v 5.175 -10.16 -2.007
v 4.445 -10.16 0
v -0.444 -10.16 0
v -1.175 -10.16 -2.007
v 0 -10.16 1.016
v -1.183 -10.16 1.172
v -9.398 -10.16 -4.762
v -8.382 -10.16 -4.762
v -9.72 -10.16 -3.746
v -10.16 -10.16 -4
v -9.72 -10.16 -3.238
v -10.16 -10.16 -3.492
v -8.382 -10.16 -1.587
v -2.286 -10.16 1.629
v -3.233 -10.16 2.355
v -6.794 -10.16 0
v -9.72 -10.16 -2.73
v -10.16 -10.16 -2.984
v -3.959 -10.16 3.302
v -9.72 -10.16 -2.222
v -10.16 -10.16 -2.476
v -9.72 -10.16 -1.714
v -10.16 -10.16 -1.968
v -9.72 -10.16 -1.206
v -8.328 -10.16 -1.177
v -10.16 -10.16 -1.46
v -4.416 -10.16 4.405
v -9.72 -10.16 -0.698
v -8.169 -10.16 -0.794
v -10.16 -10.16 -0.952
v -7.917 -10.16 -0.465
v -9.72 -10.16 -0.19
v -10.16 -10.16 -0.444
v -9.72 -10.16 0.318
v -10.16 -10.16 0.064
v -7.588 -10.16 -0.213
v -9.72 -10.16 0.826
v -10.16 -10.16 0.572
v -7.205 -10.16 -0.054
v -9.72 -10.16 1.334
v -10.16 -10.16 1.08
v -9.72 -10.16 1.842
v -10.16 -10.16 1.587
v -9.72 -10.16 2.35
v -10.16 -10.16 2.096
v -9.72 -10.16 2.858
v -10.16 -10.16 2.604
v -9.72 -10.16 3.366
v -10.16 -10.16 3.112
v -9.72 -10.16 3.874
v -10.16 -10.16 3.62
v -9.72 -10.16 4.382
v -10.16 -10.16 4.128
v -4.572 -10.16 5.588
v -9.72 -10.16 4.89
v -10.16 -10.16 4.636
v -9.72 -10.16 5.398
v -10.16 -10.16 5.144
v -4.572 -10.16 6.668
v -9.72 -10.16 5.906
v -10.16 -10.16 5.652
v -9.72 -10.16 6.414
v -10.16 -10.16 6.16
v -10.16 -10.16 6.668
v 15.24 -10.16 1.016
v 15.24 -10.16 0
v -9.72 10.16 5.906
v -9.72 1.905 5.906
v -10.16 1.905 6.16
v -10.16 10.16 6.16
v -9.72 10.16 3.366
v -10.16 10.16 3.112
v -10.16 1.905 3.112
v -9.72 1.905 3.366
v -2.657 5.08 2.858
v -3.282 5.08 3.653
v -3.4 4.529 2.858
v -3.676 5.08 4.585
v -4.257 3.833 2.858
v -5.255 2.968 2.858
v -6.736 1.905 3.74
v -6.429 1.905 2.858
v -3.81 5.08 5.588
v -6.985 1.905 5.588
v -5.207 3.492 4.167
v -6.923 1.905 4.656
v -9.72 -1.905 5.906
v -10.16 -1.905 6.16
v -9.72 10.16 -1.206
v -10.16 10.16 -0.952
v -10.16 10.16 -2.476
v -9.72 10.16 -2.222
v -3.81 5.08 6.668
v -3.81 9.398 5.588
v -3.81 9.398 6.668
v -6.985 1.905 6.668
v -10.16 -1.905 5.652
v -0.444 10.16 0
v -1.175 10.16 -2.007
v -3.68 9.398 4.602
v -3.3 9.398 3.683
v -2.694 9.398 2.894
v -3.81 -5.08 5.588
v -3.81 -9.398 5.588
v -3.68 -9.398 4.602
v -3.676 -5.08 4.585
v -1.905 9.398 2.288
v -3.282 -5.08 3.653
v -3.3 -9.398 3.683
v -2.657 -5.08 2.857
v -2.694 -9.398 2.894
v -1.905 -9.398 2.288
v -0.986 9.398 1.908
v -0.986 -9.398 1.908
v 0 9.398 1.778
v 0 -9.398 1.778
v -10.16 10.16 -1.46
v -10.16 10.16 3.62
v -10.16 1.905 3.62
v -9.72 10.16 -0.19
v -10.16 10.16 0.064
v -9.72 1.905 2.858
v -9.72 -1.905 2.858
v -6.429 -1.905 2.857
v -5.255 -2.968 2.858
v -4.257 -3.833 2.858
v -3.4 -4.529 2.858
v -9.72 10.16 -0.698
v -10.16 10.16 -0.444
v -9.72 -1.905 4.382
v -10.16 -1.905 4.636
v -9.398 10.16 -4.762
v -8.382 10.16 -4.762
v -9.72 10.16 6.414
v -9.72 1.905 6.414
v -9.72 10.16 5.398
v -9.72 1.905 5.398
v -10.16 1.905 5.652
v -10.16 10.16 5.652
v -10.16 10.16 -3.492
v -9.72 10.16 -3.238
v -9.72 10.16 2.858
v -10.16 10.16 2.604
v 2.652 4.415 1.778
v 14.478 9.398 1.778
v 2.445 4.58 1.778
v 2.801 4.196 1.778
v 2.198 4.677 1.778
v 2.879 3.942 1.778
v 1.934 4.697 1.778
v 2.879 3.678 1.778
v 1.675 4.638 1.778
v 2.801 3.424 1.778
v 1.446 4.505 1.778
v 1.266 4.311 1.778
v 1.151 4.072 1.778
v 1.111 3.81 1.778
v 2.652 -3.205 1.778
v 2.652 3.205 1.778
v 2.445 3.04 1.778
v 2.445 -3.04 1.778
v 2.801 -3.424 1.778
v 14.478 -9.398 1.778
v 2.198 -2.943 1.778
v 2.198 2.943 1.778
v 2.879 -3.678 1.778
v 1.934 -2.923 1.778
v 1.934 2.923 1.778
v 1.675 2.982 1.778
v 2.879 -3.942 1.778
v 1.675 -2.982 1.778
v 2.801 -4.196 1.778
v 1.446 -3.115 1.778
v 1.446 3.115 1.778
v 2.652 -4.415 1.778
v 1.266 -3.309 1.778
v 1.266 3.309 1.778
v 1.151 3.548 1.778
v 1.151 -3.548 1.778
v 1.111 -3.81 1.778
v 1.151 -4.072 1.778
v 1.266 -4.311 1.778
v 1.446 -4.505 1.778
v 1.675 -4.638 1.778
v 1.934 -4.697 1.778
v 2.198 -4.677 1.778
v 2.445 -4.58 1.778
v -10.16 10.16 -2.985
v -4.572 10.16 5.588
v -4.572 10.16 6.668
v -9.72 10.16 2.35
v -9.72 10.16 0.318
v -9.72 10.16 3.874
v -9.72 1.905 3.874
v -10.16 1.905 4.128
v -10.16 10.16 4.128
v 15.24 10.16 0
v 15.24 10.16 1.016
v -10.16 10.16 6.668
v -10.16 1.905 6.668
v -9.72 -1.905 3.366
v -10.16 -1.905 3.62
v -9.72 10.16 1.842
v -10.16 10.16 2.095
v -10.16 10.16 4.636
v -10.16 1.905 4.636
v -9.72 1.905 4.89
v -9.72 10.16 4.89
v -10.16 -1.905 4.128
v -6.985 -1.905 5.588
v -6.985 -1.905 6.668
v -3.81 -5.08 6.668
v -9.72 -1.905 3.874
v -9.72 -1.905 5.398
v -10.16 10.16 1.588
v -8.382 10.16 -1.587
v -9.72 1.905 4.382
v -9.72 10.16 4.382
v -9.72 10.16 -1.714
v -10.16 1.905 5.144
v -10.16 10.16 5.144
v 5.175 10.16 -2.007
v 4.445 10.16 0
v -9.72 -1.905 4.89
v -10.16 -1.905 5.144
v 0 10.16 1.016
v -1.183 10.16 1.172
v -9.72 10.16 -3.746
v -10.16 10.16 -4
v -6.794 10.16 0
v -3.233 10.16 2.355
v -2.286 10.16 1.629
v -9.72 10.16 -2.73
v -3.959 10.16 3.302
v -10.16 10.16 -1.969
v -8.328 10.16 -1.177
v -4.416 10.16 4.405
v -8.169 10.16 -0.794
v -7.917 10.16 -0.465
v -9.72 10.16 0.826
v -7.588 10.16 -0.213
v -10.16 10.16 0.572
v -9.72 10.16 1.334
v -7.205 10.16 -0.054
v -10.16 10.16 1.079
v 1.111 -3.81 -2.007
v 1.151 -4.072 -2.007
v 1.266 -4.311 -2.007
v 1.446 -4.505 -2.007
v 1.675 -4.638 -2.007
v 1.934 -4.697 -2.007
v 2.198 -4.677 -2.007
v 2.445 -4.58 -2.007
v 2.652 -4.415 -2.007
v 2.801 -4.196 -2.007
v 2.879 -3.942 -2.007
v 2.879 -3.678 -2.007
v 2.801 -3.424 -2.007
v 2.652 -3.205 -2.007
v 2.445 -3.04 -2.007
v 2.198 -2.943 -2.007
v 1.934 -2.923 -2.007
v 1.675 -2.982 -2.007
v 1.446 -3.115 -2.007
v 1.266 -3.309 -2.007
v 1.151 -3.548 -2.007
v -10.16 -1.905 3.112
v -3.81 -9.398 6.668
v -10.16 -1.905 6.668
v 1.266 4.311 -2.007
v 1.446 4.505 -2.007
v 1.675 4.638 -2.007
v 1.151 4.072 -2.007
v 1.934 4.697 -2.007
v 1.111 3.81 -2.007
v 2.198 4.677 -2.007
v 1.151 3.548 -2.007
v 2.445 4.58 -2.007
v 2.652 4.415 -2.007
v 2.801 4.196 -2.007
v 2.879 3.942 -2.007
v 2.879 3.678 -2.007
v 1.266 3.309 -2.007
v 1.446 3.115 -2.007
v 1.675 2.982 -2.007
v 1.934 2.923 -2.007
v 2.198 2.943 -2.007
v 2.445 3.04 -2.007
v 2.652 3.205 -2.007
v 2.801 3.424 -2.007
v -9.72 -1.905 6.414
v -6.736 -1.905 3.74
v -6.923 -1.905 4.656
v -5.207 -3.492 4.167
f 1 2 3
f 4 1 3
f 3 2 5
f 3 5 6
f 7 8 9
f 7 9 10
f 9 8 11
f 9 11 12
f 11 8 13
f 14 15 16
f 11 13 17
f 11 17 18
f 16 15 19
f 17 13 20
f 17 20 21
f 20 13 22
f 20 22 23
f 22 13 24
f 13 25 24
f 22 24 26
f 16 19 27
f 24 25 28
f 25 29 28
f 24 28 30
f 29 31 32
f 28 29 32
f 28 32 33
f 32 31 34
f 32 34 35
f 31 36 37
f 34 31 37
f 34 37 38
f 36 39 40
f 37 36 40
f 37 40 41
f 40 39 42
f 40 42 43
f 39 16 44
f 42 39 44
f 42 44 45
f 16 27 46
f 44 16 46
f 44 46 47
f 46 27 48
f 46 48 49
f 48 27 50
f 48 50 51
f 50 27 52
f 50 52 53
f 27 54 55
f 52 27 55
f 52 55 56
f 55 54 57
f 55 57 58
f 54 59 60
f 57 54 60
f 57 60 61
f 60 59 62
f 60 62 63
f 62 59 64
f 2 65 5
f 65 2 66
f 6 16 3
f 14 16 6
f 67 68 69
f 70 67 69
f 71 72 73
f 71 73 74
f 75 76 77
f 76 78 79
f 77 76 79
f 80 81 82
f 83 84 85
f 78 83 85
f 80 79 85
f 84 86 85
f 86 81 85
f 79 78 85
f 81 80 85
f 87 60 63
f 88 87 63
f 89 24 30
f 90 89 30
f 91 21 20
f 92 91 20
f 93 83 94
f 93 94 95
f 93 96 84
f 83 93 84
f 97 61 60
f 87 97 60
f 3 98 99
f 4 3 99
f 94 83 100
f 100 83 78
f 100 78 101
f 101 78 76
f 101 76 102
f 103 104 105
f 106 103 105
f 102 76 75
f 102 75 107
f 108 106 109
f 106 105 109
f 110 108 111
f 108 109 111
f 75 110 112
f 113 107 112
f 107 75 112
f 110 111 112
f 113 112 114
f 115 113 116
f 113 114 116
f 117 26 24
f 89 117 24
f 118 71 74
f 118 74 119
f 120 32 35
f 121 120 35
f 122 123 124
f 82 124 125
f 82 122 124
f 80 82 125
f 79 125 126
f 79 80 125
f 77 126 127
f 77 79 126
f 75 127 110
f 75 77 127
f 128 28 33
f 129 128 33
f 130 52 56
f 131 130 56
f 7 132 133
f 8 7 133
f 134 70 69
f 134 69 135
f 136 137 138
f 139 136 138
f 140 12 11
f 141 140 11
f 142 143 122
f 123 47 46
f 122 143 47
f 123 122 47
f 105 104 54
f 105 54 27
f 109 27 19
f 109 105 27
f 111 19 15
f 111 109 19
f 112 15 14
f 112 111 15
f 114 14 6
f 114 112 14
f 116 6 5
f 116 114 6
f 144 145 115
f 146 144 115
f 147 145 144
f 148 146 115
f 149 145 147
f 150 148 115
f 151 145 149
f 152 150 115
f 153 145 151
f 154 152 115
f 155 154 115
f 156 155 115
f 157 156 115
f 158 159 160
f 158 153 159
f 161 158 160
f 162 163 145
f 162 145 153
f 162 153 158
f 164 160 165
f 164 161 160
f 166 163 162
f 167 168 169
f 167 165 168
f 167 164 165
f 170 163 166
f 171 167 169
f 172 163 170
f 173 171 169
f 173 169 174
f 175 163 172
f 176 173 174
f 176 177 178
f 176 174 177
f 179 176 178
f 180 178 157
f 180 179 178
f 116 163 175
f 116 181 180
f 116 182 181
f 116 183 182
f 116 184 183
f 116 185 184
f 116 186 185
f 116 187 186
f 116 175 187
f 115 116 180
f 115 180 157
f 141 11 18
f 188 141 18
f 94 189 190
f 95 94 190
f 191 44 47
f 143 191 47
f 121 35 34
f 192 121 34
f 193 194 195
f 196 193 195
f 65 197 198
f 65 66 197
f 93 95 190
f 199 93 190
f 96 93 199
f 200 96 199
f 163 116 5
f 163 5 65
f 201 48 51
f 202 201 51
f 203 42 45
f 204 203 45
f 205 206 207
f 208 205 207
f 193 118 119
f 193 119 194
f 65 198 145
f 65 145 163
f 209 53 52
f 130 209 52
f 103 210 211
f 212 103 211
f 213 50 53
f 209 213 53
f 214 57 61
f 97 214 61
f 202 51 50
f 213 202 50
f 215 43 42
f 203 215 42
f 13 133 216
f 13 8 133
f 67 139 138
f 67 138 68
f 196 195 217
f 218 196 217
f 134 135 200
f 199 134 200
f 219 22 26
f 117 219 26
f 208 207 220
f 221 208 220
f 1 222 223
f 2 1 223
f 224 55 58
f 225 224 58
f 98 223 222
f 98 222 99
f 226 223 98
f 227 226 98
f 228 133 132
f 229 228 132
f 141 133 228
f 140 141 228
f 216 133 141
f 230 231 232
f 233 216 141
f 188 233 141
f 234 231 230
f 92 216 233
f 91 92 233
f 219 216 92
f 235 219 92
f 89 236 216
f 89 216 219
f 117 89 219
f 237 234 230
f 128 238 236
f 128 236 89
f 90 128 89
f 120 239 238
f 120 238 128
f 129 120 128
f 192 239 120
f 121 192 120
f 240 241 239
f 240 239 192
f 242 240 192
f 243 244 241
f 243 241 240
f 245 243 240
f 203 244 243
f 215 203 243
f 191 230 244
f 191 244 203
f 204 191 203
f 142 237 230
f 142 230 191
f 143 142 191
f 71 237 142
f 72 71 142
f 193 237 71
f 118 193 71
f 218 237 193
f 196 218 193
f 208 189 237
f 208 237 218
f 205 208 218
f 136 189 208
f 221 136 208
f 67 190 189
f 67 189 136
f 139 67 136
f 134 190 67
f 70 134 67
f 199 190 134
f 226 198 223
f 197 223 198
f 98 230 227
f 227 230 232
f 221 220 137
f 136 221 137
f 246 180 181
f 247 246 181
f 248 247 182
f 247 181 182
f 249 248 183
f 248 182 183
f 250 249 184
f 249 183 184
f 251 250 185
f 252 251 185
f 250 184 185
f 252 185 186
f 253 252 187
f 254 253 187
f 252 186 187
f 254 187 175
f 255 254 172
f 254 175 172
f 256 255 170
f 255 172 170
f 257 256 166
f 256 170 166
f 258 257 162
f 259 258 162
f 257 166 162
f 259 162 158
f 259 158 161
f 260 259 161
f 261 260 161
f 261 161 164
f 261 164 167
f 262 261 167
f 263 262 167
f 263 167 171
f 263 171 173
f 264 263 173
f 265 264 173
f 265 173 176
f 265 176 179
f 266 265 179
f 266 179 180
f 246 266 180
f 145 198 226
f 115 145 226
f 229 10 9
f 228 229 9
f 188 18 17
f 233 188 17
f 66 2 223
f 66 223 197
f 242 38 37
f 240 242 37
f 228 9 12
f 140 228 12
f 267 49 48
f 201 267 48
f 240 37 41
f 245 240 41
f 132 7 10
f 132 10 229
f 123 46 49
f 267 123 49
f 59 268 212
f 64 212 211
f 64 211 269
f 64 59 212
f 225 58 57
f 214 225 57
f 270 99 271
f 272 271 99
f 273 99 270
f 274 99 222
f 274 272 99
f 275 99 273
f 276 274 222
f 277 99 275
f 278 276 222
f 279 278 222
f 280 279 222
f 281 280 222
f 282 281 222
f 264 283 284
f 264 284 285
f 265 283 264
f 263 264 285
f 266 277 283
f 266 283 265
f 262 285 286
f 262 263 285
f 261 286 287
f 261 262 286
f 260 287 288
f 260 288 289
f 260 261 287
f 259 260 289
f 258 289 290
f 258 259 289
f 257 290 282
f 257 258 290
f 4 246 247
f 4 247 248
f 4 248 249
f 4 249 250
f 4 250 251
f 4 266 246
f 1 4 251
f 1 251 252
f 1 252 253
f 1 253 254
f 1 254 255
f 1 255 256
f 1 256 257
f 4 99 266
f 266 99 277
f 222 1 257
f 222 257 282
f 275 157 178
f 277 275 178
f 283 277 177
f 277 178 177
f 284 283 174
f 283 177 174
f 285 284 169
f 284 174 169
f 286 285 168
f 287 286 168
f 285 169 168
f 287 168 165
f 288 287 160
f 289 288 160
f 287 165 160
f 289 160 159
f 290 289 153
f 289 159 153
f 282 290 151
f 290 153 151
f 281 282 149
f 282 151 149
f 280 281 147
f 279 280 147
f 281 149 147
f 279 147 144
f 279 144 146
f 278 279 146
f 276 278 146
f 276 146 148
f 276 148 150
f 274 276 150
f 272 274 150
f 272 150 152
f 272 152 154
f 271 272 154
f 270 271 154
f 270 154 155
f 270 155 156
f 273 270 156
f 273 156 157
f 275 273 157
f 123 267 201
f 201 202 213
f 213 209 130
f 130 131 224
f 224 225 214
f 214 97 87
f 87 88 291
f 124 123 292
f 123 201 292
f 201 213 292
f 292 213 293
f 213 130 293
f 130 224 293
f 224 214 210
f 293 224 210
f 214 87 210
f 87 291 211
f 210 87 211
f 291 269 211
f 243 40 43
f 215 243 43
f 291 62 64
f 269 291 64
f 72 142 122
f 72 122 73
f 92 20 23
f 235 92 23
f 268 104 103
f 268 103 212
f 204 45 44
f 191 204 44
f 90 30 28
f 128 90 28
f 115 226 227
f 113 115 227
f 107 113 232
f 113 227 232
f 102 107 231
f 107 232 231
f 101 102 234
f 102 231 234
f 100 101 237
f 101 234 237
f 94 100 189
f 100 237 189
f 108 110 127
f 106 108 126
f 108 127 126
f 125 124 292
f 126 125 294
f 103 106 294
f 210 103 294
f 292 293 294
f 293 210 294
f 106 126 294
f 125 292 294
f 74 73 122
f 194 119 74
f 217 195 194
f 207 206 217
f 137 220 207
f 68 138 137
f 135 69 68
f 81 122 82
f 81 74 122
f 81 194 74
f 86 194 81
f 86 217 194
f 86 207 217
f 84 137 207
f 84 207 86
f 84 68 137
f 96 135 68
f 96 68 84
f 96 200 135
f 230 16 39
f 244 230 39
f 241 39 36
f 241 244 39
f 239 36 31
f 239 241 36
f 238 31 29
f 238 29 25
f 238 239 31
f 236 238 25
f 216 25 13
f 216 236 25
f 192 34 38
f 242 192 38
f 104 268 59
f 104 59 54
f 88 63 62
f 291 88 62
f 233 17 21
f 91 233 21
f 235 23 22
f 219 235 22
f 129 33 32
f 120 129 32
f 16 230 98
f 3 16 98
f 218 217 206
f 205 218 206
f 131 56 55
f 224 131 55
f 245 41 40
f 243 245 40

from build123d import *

# Parameters (mm, degrees)
F1_DEPTH     = 10.16
F2_W         = 3.81
F2_H         = 3.81
F3_DEPTH     = 25.4
F4_R         = 1.5875
F5_T4_DEPTH  = 20.32
F5_T10_DEPTH = 20.32
F5_T16_DEPTH = 20.32
F5_T23_DEPTH = 20.32
F5_T29_DEPTH = 20.32
F6_SIZE      = 3.175
F7_SIZE      = 0.762
F8_SIZE      = 0.762
F10_D        = 1.778
F12_DEPTH    = 25.4


# Not quite as in the source:
# - a fillet or chamfer that OpenCascade refuses, or shapes differently, is made with other operations: its cross-section is extruded or revolved along the edge and cut away or added


with BuildPart() as f1:
    # F0 (on Front) → F1 (new body, symmetric)
    with BuildSketch(Plane.XZ):
        Polygon((-8.382, 0), (-0.4445, 0), (-1.1748426721, -2.0066), (5.1751573279, -2.0066), (4.4448146558, 0), (15.24, 0), (15.24, 1.778), (-3.81, 1.778), (-3.81, 6.6675), (-10.16, 6.6675), (-10.16, -4.7625), (-8.382, -4.7625), align=None)
    extrude(amount=F1_DEPTH, both=True)

    # F2 (on face) → F3 (cut)
    with BuildSketch(Plane(origin=(-10.16, 0, 0), x_dir=(0, -1, 0), z_dir=(-1, 0, 0))):
        with Locations((0, 4.7625)):
            Rectangle(F2_W, F2_H)
    extrude(amount=-F3_DEPTH, mode=Mode.SUBTRACT)

    # F4
    f4_edges = [f1.edges().sort_by_distance(p)[0] for p in [
        (-8.382, 0, 0),
    ]]
    fillet(f4_edges, radius=F4_R)

    # F5: fillet of radius 3.81 on 1 edges, made by hand


with BuildPart() as f5_tool2:
    # F5_s3 → F5_t4 (new body)
    with BuildSketch(Plane.XZ.offset(10.16)):
        with BuildLine():
            ThreePointArc((-3.81, 5.588), (-2.6940768363, 2.8939231637), (0, 1.778))
            Line((0, 1.778), (-3.81, 1.778))
            Line((-3.81, 1.778), (-3.81, 5.588))
        make_face()
    extrude(amount=-F5_T4_DEPTH)

    split(bisect_by=Plane.XZ.offset(1.905), keep=Keep.TOP)

    split(bisect_by=Plane.XY.offset(2.8575), keep=Keep.TOP)


with BuildPart() as f1_1:
    add(f1.part)

    # F5_t1: union F5_tool2
    add(f5_tool2.part)


with BuildPart() as f5_tool8:
    # F5_s9 → F5_t10 (new body)
    with BuildSketch(Plane.XZ.offset(10.16)):
        with BuildLine():
            ThreePointArc((-3.81, 5.588), (-2.6940768363, 2.8939231637), (0, 1.778))
            Line((0, 1.778), (-3.81, 1.778))
            Line((-3.81, 1.778), (-3.81, 5.588))
        make_face()
    extrude(amount=-F5_T10_DEPTH)

    split(bisect_by=Plane.XZ.offset(1.905), keep=Keep.TOP)

    split(bisect_by=Plane.XY.offset(2.8575), keep=Keep.BOTTOM)


with BuildPart() as f1_2:
    add(f1_1.part)

    # F5_t7: union F5_tool8
    add(f5_tool8.part)


with BuildPart() as f5_tool14:
    # F5_s15 → F5_t16 (new body)
    with BuildSketch(Plane.XZ.offset(10.16)):
        with BuildLine():
            ThreePointArc((-3.81, 5.588), (-2.6940768363, 2.8939231637), (0, 1.778))
            Line((0, 1.778), (-3.81, 1.778))
            Line((-3.81, 1.778), (-3.81, 5.588))
        make_face()
    extrude(amount=-F5_T16_DEPTH)

    split(bisect_by=Plane.XZ.offset(1.905), keep=Keep.BOTTOM)

    split(bisect_by=Plane.XY.offset(2.8575), keep=Keep.BOTTOM)

    split(bisect_by=Plane.XZ.offset(-1.905), keep=Keep.TOP)


with BuildPart() as f1_3:
    add(f1_2.part)

    # F5_t13: union F5_tool14
    add(f5_tool14.part)


with BuildPart() as f5_tool21:
    # F5_s22 → F5_t23 (new body)
    with BuildSketch(Plane.XZ.offset(10.16)):
        with BuildLine():
            ThreePointArc((-3.81, 5.588), (-2.6940768363, 2.8939231637), (0, 1.778))
            Line((0, 1.778), (-3.81, 1.778))
            Line((-3.81, 1.778), (-3.81, 5.588))
        make_face()
    extrude(amount=-F5_T23_DEPTH)

    split(bisect_by=Plane.XY.offset(2.8575), keep=Keep.TOP)

    split(bisect_by=Plane.XZ.offset(-1.905), keep=Keep.BOTTOM)


with BuildPart() as f1_4:
    add(f1_3.part)

    # F5_t20: union F5_tool21
    add(f5_tool21.part)


with BuildPart() as f5_tool27:
    # F5_s28 → F5_t29 (new body)
    with BuildSketch(Plane.XZ.offset(10.16)):
        with BuildLine():
            ThreePointArc((-3.81, 5.588), (-2.6940768363, 2.8939231637), (0, 1.778))
            Line((0, 1.778), (-3.81, 1.778))
            Line((-3.81, 1.778), (-3.81, 5.588))
        make_face()
    extrude(amount=-F5_T29_DEPTH)

    split(bisect_by=Plane.XY.offset(2.8575), keep=Keep.BOTTOM)

    split(bisect_by=Plane.XZ.offset(-1.905), keep=Keep.BOTTOM)


with BuildPart() as f1_5:
    add(f1_4.part)

    # F5_t26: union F5_tool27
    add(f5_tool27.part)

    # F6
    f6_edges = [f1_5.edges().sort_by_distance(p)[0] for p in [
        (-3.509976, -1.905, 4.106052),
        (-3.509976, 1.905, 4.106052),
    ]]
    chamfer(f6_edges, length=F6_SIZE)

    # F7
    f7_edges = [f1_5.edges().sort_by_distance(p)[0] for p in [
        (-10.16, 0, -4.7625),
    ]]
    chamfer(f7_edges, length=F7_SIZE)

    # F8
    f8_edges = [f1_5.edges().sort_by_distance(p)[0] for p in [
        (-2.694077, -10.16, 2.893923),
        (7.62, -10.16, 1.778),
        (7.62, 10.16, 1.778),
        (15.24, 0, 1.778),
    ]]
    chamfer(f8_edges, length=F8_SIZE)

    # F10 (through all)
    with Locations(Plane(origin=(0, 0, -2.0066), x_dir=(1, 0, 0), z_dir=(0, 0, -1))):
        with Locations((2.0001573279, 3.81), (2.0001573279, -3.81)):
            Hole(F10_D / 2)

    # F11 (on face) → F12 (cut)
    with BuildSketch(Plane.XZ.offset(10.16)):
        Polygon((-10.16, -3.4925), (-10.16, -4.0005), (-9.7200590949, -3.7465), align=None)
        Polygon((-10.16, -2.9845), (-10.16, -3.4925), (-9.7200590949, -3.2385), align=None)
        Polygon((-10.16, -2.4765), (-10.16, -2.9845), (-9.7200590949, -2.7305), align=None)
        Polygon((-9.7200590949, -2.2225), (-10.16, -1.9685), (-10.16, -2.4765), align=None)
        Polygon((-9.7200590949, -1.7145), (-10.16, -1.4605), (-10.16, -1.9685), align=None)
        Polygon((-9.7200590949, -1.2065), (-10.16, -0.9525), (-10.16, -1.4605), align=None)
        Polygon((-9.7200590949, -0.6985), (-10.16, -0.4445), (-10.16, -0.9525), align=None)
        Polygon((-9.7200590949, -0.1905), (-10.16, 0.0635), (-10.16, -0.4445), align=None)
        Polygon((-9.7200590949, 0.3175), (-10.16, 0.5715), (-10.16, 0.0635), align=None)
        Polygon((-9.7200590949, 0.8255), (-10.16, 1.0795), (-10.16, 0.5715), align=None)
        Polygon((-9.7200590949, 1.3335), (-10.16, 1.5875), (-10.16, 1.0795), align=None)
        Polygon((-9.7200590949, 1.8415), (-10.16, 2.0955), (-10.16, 1.5875), align=None)
        Polygon((-9.7200590949, 2.3495), (-10.16, 2.6035), (-10.16, 2.0955), align=None)
        Polygon((-9.7200590949, 2.8575), (-10.16, 3.1115), (-10.16, 2.6035), align=None)
        Polygon((-9.7200590949, 3.3655), (-10.16, 3.6195), (-10.16, 3.1115), align=None)
        Polygon((-9.7200590949, 3.8735), (-10.16, 4.1275), (-10.16, 3.6195), align=None)
        Polygon((-9.7200590949, 4.3815), (-10.16, 4.6355), (-10.16, 4.1275), align=None)
        Polygon((-9.7200590949, 4.8895), (-10.16, 5.1435), (-10.16, 4.6355), align=None)
        Polygon((-9.7200590949, 5.3975), (-10.16, 5.6515), (-10.16, 5.1435), align=None)
        Polygon((-9.7200590949, 5.9055), (-10.16, 6.1595), (-10.16, 5.6515), align=None)
        Polygon((-10.16, 6.1595), (-9.7200590949, 6.4135), (-10.16, 6.6675), align=None)
    extrude(amount=-F12_DEPTH, mode=Mode.SUBTRACT)


solid = f1_5.part
